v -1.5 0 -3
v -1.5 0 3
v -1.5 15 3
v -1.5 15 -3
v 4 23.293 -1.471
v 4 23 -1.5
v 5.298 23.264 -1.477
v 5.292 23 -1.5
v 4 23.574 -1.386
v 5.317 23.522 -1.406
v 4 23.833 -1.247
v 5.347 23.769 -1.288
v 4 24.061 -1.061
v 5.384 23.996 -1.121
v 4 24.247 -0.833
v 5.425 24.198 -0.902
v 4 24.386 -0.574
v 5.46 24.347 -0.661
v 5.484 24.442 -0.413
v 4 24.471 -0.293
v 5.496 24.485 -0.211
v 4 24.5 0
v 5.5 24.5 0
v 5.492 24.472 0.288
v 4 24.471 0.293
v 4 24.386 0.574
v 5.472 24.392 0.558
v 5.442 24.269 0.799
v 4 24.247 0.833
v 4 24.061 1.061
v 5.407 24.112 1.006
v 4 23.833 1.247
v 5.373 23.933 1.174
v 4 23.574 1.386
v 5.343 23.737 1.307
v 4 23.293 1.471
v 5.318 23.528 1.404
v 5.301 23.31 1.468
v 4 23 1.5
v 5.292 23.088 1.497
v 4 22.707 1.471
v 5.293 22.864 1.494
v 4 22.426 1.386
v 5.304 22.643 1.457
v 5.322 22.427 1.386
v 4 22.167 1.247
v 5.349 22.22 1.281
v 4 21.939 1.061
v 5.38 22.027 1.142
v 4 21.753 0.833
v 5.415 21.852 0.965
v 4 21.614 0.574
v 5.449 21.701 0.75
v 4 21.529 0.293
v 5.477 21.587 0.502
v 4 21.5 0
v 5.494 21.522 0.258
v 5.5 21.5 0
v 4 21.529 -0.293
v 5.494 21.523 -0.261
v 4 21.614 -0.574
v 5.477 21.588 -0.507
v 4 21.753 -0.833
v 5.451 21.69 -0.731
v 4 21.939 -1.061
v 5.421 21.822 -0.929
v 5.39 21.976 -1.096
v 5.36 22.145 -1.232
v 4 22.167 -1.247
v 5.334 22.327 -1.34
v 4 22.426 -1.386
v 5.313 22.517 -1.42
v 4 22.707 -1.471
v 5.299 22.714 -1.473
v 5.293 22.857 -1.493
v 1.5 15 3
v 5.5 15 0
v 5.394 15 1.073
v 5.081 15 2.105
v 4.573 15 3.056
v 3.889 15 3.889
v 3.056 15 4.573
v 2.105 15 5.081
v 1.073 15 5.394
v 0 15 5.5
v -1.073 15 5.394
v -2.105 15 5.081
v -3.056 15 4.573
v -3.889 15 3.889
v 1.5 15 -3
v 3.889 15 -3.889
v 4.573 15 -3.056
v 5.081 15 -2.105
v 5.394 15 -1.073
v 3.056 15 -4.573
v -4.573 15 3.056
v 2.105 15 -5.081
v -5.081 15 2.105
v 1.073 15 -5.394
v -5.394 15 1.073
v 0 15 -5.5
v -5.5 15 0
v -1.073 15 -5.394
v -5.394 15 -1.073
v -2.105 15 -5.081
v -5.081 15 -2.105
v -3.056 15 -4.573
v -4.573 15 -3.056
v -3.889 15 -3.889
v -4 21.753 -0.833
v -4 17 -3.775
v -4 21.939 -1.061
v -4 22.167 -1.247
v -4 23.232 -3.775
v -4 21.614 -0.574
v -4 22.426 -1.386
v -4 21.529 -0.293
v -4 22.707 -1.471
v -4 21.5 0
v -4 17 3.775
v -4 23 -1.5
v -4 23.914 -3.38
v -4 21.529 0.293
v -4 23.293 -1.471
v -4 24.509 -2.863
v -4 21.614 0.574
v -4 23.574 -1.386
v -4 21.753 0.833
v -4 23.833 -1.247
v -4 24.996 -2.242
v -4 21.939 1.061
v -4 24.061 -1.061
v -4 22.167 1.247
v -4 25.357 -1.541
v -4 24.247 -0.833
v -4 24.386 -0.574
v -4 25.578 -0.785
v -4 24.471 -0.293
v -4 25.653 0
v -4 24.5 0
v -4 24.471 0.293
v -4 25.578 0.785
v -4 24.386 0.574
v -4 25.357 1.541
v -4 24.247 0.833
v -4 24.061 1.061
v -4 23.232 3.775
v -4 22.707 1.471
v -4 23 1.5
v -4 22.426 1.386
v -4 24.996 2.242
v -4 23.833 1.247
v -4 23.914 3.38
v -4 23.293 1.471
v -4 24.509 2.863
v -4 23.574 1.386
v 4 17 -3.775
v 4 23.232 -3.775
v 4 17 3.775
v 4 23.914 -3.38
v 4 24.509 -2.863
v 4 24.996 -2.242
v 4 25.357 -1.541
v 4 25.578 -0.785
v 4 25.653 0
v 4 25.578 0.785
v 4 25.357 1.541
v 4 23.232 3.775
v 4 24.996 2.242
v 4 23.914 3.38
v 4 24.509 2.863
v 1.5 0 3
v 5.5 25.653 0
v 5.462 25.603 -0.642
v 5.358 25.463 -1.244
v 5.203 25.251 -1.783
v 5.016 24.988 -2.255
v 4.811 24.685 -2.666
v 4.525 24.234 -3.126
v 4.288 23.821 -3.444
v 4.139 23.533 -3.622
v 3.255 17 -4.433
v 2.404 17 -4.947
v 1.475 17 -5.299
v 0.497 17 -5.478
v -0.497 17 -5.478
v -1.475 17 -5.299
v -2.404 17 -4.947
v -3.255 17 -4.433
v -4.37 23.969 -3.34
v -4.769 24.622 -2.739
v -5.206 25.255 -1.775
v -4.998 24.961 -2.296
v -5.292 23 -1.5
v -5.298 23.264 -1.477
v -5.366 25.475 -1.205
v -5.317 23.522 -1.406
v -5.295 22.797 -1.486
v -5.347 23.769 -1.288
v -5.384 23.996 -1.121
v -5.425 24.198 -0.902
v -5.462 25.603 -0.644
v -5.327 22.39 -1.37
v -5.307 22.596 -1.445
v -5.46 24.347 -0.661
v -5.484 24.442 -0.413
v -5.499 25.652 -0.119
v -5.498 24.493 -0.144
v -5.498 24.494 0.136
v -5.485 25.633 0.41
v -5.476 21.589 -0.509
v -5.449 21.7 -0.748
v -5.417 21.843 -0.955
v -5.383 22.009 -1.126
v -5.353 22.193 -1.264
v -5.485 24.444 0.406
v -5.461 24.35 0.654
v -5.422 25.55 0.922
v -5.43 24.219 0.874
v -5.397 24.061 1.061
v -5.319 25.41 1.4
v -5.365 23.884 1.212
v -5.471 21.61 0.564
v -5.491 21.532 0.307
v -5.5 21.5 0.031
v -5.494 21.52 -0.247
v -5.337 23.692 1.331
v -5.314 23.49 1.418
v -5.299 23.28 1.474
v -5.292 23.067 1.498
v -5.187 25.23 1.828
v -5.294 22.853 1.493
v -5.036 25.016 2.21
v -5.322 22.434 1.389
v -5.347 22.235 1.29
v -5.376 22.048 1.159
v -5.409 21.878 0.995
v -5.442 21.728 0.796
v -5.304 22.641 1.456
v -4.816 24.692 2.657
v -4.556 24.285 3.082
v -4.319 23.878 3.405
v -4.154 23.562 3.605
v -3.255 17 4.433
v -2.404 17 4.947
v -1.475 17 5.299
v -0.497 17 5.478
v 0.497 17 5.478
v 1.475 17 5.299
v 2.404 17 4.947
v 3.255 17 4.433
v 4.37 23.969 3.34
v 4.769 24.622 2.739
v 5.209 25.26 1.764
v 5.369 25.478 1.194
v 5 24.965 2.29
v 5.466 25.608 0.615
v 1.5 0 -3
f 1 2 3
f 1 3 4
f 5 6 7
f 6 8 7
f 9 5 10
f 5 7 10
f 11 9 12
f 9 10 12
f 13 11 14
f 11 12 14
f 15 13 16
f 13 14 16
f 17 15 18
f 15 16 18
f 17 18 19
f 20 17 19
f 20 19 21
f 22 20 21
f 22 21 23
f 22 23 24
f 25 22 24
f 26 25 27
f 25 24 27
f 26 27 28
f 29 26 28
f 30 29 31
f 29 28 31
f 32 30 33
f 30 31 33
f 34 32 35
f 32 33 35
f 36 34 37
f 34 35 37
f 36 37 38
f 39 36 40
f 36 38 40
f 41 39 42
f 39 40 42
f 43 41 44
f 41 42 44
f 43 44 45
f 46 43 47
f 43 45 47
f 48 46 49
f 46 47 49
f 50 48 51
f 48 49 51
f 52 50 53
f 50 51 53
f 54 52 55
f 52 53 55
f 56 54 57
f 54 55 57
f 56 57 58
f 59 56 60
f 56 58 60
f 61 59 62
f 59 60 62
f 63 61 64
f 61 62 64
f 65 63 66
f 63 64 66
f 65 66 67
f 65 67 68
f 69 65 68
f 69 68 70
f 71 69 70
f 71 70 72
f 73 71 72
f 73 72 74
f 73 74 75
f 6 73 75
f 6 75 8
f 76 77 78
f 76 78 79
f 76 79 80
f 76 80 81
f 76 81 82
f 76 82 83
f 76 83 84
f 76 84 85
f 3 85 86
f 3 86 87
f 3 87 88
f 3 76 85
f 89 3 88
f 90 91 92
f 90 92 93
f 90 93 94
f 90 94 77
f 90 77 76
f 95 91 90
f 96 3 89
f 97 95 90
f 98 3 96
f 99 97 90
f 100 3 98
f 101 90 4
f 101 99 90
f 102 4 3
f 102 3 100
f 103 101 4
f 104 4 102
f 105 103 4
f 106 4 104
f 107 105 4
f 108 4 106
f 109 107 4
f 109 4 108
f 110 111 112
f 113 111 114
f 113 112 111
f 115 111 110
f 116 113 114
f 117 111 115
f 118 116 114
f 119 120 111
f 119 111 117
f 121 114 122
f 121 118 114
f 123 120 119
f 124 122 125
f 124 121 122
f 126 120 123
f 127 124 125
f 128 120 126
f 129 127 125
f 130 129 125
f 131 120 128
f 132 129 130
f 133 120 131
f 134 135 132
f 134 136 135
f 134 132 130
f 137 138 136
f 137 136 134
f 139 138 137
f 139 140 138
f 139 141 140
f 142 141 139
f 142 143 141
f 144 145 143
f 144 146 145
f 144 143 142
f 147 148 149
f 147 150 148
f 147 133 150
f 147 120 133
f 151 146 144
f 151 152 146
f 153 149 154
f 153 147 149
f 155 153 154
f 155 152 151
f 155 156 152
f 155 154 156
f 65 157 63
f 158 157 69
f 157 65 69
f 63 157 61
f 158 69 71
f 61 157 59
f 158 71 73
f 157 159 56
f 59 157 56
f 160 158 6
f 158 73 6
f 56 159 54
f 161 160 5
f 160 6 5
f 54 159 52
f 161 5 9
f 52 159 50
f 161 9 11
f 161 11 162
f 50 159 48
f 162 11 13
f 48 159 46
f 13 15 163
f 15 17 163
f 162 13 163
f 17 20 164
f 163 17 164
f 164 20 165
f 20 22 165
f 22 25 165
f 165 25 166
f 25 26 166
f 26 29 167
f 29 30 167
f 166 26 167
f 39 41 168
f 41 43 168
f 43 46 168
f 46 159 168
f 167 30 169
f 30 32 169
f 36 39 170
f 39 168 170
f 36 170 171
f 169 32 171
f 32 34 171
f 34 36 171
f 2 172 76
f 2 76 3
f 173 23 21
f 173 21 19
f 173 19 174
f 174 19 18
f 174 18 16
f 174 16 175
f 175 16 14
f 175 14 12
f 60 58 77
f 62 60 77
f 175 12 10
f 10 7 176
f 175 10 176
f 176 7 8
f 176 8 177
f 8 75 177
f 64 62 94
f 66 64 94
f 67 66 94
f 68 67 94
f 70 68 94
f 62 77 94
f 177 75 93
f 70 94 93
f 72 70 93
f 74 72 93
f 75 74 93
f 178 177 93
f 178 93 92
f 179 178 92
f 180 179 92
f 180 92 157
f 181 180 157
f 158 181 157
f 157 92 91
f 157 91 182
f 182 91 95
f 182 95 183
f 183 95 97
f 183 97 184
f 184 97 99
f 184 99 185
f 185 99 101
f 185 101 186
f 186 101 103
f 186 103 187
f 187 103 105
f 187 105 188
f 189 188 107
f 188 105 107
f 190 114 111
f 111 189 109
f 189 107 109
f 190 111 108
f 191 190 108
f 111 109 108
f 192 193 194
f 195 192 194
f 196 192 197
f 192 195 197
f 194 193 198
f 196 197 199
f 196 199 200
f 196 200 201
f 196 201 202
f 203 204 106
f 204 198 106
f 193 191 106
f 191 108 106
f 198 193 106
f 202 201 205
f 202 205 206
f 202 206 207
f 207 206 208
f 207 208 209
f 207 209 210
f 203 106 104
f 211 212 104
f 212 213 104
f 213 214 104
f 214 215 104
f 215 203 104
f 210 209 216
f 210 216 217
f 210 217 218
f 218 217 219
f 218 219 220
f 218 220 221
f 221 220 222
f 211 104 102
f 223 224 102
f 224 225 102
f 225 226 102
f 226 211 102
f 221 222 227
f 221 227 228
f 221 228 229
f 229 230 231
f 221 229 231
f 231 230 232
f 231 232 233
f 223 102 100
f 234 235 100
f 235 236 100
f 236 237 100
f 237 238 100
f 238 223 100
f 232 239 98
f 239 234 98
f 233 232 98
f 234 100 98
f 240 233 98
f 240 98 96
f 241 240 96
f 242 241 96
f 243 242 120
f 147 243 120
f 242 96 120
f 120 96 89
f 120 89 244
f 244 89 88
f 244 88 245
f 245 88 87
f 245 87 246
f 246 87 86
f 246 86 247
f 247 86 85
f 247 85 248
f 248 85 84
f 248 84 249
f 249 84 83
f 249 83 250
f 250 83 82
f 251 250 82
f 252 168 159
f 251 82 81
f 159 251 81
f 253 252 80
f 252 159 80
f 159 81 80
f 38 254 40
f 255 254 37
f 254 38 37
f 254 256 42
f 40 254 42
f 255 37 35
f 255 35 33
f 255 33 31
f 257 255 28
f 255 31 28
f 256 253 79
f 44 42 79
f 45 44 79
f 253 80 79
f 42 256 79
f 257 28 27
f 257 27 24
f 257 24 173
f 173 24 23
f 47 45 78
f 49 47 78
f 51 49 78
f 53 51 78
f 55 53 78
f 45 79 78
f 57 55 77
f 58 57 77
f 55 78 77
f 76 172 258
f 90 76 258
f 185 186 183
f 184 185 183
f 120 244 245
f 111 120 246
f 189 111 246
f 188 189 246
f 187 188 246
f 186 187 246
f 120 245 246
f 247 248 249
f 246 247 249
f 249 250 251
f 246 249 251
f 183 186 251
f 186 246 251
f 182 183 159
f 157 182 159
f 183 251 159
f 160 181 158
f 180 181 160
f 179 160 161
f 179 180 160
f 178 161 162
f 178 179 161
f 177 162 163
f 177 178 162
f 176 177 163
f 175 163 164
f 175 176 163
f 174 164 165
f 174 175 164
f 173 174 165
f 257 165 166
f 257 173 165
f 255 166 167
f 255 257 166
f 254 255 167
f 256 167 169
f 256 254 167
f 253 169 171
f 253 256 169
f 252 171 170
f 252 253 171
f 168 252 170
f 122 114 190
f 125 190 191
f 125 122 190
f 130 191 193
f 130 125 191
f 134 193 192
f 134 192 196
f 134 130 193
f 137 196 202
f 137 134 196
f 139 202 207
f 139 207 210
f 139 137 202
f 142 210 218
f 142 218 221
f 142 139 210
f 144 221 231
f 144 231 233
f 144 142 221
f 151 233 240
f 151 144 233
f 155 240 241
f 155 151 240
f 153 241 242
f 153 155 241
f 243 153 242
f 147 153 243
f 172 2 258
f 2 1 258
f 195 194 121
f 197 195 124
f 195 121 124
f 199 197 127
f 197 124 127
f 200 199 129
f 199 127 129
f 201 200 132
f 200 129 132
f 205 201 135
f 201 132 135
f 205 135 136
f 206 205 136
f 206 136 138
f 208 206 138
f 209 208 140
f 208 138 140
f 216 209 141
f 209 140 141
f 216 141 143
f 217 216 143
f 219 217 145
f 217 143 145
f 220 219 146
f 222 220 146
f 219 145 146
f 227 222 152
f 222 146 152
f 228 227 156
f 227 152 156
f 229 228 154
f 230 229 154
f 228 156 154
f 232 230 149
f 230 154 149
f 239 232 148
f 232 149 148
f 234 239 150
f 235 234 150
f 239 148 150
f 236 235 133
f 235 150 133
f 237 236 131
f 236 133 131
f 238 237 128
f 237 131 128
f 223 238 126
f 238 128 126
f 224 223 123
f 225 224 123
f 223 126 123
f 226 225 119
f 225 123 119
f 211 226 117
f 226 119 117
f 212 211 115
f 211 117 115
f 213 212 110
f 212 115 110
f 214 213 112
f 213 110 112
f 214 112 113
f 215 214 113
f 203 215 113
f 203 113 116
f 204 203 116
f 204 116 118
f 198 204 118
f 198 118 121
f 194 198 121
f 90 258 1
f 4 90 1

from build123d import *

# Parameters (mm, degrees)
SKETCH_1_R          = 5.5
EXTRUDE_1_DEPTH     = 26
SKETCH_2_W          = 8
SKETCH_2_H          = 18
CUT_EXTRUDE_1_DEPTH = 25
SKETCH_3_R          = 1.5
CUT_EXTRUDE_2_DEPTH = 25
CUT_EXTRUDE_3_DEPTH = 11
SKETCH_6_W          = 25.84971197
SKETCH_6_H          = 26.022962568
SKETCH_6_W_2        = 3
SKETCH_6_H_2        = 6
CUT_EXTRUDE_4_DEPTH = 15


with BuildPart() as part:
    # 草图1 → 凸台-拉伸1 (new body)
    with BuildSketch(Plane(origin=(0, 0, 0), x_dir=(1, 0, 0), z_dir=(0, 1, 0))):
        Circle(SKETCH_1_R)
    extrude(amount=EXTRUDE_1_DEPTH)

    # 草图2 → 切除-拉伸1 (cut, symmetric)
    with BuildSketch(Plane.XY):
        with Locations((0, 26)):
            Rectangle(SKETCH_2_W, SKETCH_2_H)
    extrude(amount=CUT_EXTRUDE_1_DEPTH, both=True, mode=Mode.SUBTRACT)

    # 草图3 → 切除-拉伸2 (cut, symmetric)
    with BuildSketch(Plane(origin=(-4, 0, 0), x_dir=(0, 0, -1), z_dir=(1, 0, 0))):
        with Locations((0, 23)):
            Circle(SKETCH_3_R)
    extrude(amount=CUT_EXTRUDE_2_DEPTH, both=True, mode=Mode.SUBTRACT)

    # 草图5 → 切除-拉伸3 (cut, symmetric)
    with BuildSketch(Plane(origin=(0, 0, 0), x_dir=(0, 0, -1), z_dir=(1, 0, 0))):
        with BuildLine():
            Line((-4.153311931, 21.5), (-12.215121886, 24.91830584))
            Line((-12.215121886, 24.91830584), (0.629850505, 32.78071868))
            Line((0.629850505, 32.78071868), (12.991410006, 24.598657791))
            Line((12.991410006, 24.598657791), (4.153311931, 21.5))
            ThreePointArc((4.153311931, 21.5), (0, 25.653311931), (-4.153311931, 21.5))
        make_face()
    extrude(amount=CUT_EXTRUDE_3_DEPTH, both=True, mode=Mode.SUBTRACT)

    # 草图6 → 切除-拉伸4 (cut)
    with BuildSketch(Plane(origin=(0, 0, 0), x_dir=(-1, 0, 0), z_dir=(0, -1, 0))):
        Rectangle(SKETCH_6_W, SKETCH_6_H)
        Rectangle(SKETCH_6_W_2, SKETCH_6_H_2, mode=Mode.SUBTRACT)
    extrude(amount=-CUT_EXTRUDE_4_DEPTH, mode=Mode.SUBTRACT)


solid = part.part
